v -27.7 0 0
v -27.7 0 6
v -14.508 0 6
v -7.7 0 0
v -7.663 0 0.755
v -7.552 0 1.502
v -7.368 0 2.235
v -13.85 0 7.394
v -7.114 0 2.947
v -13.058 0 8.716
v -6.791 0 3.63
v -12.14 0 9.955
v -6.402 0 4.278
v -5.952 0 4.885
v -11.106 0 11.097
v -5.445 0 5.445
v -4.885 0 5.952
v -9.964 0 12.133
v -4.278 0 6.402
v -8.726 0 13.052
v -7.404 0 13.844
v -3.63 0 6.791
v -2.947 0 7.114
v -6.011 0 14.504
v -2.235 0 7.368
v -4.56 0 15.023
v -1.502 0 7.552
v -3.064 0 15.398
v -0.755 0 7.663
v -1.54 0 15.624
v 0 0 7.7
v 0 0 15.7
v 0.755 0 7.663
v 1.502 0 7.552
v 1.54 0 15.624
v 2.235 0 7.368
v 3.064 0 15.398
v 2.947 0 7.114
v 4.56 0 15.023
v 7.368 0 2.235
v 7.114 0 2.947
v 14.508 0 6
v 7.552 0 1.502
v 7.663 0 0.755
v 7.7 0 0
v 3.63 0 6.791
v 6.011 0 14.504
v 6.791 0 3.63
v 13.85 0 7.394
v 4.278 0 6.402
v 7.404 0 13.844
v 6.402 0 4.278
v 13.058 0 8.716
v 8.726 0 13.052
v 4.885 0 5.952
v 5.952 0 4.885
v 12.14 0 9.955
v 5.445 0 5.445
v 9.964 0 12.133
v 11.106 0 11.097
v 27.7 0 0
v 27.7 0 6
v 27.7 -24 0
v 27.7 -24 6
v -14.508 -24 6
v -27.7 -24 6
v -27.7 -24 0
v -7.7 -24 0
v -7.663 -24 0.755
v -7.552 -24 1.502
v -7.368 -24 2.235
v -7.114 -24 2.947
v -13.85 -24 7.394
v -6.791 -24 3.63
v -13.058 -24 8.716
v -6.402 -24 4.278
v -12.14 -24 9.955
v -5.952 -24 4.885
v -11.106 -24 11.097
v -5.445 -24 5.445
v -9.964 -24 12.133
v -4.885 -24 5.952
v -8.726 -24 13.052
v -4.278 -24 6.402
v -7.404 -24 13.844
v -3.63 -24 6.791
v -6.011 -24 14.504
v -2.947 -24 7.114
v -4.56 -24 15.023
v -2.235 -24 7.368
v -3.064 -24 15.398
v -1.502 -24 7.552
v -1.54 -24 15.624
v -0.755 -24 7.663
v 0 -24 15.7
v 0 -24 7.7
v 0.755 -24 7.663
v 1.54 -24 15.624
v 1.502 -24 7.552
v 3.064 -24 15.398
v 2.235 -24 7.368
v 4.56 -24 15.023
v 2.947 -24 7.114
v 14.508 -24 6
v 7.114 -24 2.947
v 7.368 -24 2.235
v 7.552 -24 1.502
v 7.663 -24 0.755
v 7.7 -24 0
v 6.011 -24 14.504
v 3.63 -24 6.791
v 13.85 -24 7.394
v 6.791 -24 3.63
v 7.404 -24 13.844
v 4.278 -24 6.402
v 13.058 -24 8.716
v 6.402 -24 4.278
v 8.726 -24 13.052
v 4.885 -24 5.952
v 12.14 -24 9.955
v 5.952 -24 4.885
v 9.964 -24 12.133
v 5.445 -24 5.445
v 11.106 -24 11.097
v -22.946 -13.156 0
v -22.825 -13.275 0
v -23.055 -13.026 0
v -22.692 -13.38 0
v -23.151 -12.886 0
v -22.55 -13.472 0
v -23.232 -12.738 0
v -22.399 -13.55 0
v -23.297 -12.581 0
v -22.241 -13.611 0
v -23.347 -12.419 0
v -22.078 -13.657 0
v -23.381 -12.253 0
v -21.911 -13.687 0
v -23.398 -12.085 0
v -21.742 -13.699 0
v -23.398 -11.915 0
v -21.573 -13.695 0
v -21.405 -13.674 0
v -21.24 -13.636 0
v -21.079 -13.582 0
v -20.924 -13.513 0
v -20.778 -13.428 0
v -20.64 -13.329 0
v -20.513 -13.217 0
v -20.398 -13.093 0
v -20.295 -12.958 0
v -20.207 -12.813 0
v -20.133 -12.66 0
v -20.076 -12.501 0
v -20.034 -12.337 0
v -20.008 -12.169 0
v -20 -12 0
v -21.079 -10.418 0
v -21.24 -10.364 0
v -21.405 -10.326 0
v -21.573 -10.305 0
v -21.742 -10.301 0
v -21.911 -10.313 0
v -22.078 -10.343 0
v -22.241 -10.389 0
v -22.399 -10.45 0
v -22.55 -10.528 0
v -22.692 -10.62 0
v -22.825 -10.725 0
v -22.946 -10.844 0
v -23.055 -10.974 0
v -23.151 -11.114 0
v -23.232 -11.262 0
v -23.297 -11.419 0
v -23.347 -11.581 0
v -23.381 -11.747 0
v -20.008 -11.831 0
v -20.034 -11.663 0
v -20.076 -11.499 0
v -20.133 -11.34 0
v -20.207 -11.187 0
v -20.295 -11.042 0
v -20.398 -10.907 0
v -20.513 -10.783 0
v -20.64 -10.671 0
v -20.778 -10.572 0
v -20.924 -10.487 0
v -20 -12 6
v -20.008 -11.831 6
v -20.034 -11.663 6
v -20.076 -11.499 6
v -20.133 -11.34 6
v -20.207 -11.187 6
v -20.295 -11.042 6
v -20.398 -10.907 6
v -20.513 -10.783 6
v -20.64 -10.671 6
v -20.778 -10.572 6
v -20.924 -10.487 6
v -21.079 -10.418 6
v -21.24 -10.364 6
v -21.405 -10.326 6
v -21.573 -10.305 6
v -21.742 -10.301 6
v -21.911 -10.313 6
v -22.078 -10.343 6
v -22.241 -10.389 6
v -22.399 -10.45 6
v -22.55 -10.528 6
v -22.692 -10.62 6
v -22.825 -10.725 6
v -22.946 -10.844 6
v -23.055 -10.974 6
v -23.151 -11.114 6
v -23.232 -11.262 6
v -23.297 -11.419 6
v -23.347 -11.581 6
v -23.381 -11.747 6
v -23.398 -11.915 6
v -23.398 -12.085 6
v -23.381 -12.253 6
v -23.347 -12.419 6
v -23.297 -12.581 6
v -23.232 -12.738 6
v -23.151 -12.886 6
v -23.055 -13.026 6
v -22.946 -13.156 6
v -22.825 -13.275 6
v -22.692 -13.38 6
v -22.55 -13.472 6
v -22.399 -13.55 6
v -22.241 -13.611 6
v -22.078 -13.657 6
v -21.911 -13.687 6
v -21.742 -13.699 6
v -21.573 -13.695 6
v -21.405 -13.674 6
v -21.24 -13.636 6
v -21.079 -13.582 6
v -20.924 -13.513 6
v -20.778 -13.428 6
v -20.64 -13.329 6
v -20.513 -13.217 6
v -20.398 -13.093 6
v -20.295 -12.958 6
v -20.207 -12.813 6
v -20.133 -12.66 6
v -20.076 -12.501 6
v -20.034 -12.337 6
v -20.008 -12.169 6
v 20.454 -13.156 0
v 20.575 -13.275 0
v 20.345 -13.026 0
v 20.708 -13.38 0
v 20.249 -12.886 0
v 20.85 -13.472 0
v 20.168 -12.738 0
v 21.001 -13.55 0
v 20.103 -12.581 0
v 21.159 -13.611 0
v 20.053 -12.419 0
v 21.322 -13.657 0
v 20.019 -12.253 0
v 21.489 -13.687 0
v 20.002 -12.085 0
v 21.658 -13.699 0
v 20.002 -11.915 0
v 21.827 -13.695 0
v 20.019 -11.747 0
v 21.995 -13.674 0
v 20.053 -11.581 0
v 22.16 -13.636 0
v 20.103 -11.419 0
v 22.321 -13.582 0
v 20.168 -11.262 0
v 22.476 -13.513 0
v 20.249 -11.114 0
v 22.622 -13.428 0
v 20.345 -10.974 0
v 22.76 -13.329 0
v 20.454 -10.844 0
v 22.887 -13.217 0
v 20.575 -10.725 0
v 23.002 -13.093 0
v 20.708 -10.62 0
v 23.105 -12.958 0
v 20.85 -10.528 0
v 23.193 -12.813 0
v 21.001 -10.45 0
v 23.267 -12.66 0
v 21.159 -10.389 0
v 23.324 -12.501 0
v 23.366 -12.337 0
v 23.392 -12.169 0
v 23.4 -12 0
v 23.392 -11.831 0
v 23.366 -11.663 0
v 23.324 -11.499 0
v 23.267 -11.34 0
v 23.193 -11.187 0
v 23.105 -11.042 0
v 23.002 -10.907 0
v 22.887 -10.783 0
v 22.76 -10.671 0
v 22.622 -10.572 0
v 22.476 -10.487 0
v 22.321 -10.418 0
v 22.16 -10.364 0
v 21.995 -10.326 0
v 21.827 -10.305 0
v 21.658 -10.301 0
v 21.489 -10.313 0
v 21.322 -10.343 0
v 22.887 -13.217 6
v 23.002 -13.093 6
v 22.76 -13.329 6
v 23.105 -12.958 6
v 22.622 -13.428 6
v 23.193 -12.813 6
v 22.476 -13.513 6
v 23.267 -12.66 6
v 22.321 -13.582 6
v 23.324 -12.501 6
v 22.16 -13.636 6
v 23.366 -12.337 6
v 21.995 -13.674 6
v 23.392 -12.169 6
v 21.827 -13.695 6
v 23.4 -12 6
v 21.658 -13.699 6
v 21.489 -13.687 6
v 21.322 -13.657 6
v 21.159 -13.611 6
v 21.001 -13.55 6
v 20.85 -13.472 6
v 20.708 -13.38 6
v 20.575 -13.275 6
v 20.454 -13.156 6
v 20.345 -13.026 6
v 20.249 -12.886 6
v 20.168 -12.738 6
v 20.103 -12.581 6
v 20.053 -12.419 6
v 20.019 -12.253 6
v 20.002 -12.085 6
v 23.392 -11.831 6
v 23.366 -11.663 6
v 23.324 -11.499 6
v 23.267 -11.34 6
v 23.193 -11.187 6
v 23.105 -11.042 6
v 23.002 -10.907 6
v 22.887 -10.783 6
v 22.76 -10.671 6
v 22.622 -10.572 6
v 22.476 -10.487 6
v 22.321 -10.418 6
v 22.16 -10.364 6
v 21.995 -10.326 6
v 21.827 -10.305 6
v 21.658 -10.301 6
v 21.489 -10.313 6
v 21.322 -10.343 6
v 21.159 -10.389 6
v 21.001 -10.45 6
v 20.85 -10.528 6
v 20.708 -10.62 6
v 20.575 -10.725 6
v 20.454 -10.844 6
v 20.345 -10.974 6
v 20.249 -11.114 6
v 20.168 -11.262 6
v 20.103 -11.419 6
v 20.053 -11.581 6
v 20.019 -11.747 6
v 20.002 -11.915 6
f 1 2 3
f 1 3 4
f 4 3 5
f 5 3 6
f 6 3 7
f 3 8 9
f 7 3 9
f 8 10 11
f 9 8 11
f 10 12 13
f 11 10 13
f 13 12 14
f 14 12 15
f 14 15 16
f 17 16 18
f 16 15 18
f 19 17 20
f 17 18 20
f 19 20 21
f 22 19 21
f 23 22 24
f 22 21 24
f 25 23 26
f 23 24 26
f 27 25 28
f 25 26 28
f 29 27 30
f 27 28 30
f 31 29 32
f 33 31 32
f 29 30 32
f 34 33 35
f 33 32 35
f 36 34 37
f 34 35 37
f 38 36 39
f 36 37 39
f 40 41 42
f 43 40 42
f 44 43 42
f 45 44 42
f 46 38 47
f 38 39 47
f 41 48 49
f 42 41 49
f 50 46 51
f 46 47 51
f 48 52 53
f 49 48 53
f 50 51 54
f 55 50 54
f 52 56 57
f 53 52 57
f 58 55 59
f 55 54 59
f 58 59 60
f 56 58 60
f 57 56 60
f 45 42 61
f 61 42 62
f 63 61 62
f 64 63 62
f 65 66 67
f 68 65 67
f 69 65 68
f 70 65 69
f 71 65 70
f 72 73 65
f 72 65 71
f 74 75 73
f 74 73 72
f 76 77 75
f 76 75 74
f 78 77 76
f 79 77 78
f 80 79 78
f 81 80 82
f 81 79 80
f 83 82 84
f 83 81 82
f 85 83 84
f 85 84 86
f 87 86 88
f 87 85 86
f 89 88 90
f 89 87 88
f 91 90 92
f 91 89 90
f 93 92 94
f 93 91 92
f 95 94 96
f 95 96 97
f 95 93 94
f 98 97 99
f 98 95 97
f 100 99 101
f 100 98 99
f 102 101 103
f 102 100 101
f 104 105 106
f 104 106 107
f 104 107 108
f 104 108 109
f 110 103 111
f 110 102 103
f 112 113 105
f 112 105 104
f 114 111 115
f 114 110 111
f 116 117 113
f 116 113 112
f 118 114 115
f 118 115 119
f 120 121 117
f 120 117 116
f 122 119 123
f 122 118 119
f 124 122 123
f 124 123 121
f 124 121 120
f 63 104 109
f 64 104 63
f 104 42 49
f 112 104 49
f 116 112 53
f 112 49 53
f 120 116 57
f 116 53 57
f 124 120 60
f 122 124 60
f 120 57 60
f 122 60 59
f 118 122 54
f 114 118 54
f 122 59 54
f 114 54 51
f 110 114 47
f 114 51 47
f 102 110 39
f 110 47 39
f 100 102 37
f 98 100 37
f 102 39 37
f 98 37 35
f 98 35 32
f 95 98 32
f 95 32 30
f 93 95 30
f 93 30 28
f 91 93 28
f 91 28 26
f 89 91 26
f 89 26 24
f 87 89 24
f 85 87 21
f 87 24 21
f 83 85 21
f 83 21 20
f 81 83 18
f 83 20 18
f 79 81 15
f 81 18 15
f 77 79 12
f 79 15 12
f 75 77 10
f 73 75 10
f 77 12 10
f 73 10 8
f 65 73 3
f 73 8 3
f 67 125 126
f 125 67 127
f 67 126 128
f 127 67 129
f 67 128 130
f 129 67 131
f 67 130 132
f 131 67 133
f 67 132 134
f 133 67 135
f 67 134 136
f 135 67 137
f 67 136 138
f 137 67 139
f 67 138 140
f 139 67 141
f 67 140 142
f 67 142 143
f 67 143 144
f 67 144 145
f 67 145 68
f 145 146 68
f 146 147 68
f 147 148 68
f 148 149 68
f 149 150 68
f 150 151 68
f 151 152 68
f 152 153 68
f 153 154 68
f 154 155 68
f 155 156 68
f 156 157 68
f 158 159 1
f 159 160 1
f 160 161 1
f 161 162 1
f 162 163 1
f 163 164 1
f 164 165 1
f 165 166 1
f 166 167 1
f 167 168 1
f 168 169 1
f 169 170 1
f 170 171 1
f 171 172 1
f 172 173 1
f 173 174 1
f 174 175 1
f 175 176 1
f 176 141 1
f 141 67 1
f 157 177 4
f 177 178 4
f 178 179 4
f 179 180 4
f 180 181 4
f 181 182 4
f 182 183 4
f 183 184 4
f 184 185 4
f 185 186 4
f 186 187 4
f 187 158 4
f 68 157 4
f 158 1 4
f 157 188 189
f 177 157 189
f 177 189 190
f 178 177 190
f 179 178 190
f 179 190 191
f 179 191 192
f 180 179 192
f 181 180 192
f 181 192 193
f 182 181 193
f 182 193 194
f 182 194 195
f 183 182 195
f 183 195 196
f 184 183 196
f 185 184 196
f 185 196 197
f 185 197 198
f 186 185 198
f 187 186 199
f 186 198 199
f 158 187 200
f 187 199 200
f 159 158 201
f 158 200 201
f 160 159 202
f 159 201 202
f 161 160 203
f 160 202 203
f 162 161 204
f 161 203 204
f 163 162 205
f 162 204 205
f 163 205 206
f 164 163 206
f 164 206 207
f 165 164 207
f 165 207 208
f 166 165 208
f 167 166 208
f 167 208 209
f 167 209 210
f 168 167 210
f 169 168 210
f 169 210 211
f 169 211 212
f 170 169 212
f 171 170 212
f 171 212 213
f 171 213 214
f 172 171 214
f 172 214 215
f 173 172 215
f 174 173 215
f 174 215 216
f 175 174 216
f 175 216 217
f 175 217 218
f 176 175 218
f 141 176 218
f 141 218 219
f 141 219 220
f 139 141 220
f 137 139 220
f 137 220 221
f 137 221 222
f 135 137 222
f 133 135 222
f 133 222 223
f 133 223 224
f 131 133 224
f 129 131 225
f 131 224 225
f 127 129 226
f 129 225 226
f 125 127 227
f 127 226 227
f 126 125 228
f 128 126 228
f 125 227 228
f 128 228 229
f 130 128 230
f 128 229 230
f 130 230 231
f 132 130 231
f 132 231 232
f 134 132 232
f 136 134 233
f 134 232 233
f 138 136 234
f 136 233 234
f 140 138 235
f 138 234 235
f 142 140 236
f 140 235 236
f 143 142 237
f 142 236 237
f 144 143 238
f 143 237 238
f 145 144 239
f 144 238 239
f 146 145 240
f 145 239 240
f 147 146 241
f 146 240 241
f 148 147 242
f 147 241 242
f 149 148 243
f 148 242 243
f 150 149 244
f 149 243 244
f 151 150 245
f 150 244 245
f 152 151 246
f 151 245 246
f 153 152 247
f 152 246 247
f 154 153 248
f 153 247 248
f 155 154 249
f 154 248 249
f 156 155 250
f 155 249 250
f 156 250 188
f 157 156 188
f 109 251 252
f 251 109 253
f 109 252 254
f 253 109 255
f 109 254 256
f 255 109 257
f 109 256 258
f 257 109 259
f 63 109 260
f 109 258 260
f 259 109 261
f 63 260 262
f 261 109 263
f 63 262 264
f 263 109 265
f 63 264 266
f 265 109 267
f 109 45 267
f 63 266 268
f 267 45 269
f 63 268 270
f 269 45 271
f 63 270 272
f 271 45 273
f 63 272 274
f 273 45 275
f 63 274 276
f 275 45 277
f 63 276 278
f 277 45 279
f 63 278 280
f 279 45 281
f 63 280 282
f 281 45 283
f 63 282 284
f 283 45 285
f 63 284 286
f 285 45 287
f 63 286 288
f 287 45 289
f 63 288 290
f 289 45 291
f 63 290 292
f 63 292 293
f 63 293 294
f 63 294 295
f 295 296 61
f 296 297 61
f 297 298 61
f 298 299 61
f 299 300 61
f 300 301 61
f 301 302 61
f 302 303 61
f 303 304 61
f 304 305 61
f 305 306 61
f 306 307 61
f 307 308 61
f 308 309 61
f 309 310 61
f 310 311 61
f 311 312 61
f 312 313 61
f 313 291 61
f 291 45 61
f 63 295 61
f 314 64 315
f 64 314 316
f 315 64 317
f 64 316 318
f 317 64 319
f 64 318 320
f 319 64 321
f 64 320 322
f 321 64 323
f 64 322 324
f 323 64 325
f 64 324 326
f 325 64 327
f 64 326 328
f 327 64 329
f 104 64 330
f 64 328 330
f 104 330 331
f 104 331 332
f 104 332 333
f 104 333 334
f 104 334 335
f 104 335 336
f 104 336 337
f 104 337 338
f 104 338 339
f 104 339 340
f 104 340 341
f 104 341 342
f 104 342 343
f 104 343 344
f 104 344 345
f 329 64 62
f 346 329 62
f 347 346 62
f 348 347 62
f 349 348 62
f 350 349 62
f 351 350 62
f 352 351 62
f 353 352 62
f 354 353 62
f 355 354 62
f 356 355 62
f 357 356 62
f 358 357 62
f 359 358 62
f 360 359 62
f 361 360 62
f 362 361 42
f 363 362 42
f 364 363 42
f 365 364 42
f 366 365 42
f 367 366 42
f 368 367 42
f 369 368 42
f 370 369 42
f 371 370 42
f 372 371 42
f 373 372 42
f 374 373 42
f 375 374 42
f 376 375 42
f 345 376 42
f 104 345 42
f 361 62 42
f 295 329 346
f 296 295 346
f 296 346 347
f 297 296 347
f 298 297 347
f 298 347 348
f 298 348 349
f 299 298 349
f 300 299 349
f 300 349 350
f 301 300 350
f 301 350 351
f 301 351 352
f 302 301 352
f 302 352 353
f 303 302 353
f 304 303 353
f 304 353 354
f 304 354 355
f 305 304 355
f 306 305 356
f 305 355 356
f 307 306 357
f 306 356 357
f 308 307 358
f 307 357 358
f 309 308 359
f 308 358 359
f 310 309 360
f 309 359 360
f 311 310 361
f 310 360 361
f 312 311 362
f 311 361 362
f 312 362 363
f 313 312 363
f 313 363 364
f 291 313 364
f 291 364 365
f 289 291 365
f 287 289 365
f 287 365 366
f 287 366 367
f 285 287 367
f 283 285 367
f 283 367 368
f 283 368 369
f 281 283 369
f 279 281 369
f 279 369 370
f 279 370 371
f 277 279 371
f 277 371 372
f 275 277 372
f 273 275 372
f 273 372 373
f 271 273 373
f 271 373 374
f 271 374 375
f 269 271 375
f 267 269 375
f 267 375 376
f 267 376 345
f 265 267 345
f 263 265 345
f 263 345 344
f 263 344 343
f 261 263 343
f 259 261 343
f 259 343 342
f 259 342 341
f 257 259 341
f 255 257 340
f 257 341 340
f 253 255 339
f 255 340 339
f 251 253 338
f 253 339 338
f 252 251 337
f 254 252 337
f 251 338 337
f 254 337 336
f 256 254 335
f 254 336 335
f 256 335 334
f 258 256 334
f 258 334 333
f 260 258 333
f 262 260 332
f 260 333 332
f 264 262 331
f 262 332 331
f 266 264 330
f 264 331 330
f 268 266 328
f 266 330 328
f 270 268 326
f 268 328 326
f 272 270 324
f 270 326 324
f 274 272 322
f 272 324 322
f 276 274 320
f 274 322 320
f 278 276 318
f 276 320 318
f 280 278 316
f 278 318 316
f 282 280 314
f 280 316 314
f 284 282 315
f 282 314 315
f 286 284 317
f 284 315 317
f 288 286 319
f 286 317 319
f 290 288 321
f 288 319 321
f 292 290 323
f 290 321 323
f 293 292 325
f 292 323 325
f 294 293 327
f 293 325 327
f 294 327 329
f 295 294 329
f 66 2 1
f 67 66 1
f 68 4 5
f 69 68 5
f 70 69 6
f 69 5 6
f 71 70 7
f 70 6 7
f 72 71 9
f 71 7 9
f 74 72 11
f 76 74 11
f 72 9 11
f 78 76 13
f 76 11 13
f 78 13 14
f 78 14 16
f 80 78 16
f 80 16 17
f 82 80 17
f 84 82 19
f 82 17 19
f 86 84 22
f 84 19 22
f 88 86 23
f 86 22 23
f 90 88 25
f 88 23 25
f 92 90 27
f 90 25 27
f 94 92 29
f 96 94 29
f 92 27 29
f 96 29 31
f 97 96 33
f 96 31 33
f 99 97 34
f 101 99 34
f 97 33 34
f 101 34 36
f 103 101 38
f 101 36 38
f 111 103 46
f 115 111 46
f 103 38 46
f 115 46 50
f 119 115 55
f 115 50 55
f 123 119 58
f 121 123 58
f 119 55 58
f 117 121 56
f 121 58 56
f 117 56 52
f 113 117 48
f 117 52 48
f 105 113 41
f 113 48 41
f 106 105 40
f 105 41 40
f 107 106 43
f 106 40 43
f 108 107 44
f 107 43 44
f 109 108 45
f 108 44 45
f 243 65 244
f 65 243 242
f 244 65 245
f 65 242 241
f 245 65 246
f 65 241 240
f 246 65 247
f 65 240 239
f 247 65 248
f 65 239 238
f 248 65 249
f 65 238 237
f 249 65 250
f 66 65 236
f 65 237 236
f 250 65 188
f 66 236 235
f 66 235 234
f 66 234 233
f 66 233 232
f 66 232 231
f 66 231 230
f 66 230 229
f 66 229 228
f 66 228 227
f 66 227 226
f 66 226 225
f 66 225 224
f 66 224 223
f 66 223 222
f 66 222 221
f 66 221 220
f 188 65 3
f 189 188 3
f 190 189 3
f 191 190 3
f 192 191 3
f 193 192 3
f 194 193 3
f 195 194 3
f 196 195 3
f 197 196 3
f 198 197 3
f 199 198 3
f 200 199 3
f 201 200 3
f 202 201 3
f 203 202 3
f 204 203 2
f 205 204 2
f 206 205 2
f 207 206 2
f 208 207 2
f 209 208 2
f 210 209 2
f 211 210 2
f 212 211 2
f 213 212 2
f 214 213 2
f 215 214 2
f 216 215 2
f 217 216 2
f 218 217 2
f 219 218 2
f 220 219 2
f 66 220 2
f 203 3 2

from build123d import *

# Parameters (mm, degrees)
F1_DEPTH = 24
F2_R     = 1.7
F3_DEPTH = 25


# Not quite as in the source:
# - a feature names something its author has since deleted; it is built from what else it names


with BuildPart() as f1:
    # F0 (on Front) → F1 (new body)
    with BuildSketch(Plane.XZ):
        with BuildLine():
            ThreePointArc((-7.7, 0), (0, 7.7), (7.7, 0))
            Line((7.7, 0), (15.7, 0))
            Line((15.7, 0), (27.7, 0))
            Line((27.7, 0), (27.7, 6))
            Line((27.7, 6), (14.5082735017, 6))
            ThreePointArc((14.5082735017, 6), (0, 15.7), (-14.5082735017, 6))
            Line((-14.5082735017, 6), (-27.7, 6))
            Line((-27.7, 6), (-27.7, 0))
            Line((-27.7, 0), (-15.7, 0))
            Line((-15.7, 0), (-7.7, 0))
        make_face()
    extrude(amount=F1_DEPTH)

    # F2 (on face) → F3 (cut)
    with BuildSketch(Plane.XY.offset(6)):
        with Locations((-21.7, -12)):
            Circle(F2_R)
        with Locations((21.7, -12)):
            Circle(F2_R)
    extrude(amount=-F3_DEPTH, mode=Mode.SUBTRACT)


solid = f1.part
